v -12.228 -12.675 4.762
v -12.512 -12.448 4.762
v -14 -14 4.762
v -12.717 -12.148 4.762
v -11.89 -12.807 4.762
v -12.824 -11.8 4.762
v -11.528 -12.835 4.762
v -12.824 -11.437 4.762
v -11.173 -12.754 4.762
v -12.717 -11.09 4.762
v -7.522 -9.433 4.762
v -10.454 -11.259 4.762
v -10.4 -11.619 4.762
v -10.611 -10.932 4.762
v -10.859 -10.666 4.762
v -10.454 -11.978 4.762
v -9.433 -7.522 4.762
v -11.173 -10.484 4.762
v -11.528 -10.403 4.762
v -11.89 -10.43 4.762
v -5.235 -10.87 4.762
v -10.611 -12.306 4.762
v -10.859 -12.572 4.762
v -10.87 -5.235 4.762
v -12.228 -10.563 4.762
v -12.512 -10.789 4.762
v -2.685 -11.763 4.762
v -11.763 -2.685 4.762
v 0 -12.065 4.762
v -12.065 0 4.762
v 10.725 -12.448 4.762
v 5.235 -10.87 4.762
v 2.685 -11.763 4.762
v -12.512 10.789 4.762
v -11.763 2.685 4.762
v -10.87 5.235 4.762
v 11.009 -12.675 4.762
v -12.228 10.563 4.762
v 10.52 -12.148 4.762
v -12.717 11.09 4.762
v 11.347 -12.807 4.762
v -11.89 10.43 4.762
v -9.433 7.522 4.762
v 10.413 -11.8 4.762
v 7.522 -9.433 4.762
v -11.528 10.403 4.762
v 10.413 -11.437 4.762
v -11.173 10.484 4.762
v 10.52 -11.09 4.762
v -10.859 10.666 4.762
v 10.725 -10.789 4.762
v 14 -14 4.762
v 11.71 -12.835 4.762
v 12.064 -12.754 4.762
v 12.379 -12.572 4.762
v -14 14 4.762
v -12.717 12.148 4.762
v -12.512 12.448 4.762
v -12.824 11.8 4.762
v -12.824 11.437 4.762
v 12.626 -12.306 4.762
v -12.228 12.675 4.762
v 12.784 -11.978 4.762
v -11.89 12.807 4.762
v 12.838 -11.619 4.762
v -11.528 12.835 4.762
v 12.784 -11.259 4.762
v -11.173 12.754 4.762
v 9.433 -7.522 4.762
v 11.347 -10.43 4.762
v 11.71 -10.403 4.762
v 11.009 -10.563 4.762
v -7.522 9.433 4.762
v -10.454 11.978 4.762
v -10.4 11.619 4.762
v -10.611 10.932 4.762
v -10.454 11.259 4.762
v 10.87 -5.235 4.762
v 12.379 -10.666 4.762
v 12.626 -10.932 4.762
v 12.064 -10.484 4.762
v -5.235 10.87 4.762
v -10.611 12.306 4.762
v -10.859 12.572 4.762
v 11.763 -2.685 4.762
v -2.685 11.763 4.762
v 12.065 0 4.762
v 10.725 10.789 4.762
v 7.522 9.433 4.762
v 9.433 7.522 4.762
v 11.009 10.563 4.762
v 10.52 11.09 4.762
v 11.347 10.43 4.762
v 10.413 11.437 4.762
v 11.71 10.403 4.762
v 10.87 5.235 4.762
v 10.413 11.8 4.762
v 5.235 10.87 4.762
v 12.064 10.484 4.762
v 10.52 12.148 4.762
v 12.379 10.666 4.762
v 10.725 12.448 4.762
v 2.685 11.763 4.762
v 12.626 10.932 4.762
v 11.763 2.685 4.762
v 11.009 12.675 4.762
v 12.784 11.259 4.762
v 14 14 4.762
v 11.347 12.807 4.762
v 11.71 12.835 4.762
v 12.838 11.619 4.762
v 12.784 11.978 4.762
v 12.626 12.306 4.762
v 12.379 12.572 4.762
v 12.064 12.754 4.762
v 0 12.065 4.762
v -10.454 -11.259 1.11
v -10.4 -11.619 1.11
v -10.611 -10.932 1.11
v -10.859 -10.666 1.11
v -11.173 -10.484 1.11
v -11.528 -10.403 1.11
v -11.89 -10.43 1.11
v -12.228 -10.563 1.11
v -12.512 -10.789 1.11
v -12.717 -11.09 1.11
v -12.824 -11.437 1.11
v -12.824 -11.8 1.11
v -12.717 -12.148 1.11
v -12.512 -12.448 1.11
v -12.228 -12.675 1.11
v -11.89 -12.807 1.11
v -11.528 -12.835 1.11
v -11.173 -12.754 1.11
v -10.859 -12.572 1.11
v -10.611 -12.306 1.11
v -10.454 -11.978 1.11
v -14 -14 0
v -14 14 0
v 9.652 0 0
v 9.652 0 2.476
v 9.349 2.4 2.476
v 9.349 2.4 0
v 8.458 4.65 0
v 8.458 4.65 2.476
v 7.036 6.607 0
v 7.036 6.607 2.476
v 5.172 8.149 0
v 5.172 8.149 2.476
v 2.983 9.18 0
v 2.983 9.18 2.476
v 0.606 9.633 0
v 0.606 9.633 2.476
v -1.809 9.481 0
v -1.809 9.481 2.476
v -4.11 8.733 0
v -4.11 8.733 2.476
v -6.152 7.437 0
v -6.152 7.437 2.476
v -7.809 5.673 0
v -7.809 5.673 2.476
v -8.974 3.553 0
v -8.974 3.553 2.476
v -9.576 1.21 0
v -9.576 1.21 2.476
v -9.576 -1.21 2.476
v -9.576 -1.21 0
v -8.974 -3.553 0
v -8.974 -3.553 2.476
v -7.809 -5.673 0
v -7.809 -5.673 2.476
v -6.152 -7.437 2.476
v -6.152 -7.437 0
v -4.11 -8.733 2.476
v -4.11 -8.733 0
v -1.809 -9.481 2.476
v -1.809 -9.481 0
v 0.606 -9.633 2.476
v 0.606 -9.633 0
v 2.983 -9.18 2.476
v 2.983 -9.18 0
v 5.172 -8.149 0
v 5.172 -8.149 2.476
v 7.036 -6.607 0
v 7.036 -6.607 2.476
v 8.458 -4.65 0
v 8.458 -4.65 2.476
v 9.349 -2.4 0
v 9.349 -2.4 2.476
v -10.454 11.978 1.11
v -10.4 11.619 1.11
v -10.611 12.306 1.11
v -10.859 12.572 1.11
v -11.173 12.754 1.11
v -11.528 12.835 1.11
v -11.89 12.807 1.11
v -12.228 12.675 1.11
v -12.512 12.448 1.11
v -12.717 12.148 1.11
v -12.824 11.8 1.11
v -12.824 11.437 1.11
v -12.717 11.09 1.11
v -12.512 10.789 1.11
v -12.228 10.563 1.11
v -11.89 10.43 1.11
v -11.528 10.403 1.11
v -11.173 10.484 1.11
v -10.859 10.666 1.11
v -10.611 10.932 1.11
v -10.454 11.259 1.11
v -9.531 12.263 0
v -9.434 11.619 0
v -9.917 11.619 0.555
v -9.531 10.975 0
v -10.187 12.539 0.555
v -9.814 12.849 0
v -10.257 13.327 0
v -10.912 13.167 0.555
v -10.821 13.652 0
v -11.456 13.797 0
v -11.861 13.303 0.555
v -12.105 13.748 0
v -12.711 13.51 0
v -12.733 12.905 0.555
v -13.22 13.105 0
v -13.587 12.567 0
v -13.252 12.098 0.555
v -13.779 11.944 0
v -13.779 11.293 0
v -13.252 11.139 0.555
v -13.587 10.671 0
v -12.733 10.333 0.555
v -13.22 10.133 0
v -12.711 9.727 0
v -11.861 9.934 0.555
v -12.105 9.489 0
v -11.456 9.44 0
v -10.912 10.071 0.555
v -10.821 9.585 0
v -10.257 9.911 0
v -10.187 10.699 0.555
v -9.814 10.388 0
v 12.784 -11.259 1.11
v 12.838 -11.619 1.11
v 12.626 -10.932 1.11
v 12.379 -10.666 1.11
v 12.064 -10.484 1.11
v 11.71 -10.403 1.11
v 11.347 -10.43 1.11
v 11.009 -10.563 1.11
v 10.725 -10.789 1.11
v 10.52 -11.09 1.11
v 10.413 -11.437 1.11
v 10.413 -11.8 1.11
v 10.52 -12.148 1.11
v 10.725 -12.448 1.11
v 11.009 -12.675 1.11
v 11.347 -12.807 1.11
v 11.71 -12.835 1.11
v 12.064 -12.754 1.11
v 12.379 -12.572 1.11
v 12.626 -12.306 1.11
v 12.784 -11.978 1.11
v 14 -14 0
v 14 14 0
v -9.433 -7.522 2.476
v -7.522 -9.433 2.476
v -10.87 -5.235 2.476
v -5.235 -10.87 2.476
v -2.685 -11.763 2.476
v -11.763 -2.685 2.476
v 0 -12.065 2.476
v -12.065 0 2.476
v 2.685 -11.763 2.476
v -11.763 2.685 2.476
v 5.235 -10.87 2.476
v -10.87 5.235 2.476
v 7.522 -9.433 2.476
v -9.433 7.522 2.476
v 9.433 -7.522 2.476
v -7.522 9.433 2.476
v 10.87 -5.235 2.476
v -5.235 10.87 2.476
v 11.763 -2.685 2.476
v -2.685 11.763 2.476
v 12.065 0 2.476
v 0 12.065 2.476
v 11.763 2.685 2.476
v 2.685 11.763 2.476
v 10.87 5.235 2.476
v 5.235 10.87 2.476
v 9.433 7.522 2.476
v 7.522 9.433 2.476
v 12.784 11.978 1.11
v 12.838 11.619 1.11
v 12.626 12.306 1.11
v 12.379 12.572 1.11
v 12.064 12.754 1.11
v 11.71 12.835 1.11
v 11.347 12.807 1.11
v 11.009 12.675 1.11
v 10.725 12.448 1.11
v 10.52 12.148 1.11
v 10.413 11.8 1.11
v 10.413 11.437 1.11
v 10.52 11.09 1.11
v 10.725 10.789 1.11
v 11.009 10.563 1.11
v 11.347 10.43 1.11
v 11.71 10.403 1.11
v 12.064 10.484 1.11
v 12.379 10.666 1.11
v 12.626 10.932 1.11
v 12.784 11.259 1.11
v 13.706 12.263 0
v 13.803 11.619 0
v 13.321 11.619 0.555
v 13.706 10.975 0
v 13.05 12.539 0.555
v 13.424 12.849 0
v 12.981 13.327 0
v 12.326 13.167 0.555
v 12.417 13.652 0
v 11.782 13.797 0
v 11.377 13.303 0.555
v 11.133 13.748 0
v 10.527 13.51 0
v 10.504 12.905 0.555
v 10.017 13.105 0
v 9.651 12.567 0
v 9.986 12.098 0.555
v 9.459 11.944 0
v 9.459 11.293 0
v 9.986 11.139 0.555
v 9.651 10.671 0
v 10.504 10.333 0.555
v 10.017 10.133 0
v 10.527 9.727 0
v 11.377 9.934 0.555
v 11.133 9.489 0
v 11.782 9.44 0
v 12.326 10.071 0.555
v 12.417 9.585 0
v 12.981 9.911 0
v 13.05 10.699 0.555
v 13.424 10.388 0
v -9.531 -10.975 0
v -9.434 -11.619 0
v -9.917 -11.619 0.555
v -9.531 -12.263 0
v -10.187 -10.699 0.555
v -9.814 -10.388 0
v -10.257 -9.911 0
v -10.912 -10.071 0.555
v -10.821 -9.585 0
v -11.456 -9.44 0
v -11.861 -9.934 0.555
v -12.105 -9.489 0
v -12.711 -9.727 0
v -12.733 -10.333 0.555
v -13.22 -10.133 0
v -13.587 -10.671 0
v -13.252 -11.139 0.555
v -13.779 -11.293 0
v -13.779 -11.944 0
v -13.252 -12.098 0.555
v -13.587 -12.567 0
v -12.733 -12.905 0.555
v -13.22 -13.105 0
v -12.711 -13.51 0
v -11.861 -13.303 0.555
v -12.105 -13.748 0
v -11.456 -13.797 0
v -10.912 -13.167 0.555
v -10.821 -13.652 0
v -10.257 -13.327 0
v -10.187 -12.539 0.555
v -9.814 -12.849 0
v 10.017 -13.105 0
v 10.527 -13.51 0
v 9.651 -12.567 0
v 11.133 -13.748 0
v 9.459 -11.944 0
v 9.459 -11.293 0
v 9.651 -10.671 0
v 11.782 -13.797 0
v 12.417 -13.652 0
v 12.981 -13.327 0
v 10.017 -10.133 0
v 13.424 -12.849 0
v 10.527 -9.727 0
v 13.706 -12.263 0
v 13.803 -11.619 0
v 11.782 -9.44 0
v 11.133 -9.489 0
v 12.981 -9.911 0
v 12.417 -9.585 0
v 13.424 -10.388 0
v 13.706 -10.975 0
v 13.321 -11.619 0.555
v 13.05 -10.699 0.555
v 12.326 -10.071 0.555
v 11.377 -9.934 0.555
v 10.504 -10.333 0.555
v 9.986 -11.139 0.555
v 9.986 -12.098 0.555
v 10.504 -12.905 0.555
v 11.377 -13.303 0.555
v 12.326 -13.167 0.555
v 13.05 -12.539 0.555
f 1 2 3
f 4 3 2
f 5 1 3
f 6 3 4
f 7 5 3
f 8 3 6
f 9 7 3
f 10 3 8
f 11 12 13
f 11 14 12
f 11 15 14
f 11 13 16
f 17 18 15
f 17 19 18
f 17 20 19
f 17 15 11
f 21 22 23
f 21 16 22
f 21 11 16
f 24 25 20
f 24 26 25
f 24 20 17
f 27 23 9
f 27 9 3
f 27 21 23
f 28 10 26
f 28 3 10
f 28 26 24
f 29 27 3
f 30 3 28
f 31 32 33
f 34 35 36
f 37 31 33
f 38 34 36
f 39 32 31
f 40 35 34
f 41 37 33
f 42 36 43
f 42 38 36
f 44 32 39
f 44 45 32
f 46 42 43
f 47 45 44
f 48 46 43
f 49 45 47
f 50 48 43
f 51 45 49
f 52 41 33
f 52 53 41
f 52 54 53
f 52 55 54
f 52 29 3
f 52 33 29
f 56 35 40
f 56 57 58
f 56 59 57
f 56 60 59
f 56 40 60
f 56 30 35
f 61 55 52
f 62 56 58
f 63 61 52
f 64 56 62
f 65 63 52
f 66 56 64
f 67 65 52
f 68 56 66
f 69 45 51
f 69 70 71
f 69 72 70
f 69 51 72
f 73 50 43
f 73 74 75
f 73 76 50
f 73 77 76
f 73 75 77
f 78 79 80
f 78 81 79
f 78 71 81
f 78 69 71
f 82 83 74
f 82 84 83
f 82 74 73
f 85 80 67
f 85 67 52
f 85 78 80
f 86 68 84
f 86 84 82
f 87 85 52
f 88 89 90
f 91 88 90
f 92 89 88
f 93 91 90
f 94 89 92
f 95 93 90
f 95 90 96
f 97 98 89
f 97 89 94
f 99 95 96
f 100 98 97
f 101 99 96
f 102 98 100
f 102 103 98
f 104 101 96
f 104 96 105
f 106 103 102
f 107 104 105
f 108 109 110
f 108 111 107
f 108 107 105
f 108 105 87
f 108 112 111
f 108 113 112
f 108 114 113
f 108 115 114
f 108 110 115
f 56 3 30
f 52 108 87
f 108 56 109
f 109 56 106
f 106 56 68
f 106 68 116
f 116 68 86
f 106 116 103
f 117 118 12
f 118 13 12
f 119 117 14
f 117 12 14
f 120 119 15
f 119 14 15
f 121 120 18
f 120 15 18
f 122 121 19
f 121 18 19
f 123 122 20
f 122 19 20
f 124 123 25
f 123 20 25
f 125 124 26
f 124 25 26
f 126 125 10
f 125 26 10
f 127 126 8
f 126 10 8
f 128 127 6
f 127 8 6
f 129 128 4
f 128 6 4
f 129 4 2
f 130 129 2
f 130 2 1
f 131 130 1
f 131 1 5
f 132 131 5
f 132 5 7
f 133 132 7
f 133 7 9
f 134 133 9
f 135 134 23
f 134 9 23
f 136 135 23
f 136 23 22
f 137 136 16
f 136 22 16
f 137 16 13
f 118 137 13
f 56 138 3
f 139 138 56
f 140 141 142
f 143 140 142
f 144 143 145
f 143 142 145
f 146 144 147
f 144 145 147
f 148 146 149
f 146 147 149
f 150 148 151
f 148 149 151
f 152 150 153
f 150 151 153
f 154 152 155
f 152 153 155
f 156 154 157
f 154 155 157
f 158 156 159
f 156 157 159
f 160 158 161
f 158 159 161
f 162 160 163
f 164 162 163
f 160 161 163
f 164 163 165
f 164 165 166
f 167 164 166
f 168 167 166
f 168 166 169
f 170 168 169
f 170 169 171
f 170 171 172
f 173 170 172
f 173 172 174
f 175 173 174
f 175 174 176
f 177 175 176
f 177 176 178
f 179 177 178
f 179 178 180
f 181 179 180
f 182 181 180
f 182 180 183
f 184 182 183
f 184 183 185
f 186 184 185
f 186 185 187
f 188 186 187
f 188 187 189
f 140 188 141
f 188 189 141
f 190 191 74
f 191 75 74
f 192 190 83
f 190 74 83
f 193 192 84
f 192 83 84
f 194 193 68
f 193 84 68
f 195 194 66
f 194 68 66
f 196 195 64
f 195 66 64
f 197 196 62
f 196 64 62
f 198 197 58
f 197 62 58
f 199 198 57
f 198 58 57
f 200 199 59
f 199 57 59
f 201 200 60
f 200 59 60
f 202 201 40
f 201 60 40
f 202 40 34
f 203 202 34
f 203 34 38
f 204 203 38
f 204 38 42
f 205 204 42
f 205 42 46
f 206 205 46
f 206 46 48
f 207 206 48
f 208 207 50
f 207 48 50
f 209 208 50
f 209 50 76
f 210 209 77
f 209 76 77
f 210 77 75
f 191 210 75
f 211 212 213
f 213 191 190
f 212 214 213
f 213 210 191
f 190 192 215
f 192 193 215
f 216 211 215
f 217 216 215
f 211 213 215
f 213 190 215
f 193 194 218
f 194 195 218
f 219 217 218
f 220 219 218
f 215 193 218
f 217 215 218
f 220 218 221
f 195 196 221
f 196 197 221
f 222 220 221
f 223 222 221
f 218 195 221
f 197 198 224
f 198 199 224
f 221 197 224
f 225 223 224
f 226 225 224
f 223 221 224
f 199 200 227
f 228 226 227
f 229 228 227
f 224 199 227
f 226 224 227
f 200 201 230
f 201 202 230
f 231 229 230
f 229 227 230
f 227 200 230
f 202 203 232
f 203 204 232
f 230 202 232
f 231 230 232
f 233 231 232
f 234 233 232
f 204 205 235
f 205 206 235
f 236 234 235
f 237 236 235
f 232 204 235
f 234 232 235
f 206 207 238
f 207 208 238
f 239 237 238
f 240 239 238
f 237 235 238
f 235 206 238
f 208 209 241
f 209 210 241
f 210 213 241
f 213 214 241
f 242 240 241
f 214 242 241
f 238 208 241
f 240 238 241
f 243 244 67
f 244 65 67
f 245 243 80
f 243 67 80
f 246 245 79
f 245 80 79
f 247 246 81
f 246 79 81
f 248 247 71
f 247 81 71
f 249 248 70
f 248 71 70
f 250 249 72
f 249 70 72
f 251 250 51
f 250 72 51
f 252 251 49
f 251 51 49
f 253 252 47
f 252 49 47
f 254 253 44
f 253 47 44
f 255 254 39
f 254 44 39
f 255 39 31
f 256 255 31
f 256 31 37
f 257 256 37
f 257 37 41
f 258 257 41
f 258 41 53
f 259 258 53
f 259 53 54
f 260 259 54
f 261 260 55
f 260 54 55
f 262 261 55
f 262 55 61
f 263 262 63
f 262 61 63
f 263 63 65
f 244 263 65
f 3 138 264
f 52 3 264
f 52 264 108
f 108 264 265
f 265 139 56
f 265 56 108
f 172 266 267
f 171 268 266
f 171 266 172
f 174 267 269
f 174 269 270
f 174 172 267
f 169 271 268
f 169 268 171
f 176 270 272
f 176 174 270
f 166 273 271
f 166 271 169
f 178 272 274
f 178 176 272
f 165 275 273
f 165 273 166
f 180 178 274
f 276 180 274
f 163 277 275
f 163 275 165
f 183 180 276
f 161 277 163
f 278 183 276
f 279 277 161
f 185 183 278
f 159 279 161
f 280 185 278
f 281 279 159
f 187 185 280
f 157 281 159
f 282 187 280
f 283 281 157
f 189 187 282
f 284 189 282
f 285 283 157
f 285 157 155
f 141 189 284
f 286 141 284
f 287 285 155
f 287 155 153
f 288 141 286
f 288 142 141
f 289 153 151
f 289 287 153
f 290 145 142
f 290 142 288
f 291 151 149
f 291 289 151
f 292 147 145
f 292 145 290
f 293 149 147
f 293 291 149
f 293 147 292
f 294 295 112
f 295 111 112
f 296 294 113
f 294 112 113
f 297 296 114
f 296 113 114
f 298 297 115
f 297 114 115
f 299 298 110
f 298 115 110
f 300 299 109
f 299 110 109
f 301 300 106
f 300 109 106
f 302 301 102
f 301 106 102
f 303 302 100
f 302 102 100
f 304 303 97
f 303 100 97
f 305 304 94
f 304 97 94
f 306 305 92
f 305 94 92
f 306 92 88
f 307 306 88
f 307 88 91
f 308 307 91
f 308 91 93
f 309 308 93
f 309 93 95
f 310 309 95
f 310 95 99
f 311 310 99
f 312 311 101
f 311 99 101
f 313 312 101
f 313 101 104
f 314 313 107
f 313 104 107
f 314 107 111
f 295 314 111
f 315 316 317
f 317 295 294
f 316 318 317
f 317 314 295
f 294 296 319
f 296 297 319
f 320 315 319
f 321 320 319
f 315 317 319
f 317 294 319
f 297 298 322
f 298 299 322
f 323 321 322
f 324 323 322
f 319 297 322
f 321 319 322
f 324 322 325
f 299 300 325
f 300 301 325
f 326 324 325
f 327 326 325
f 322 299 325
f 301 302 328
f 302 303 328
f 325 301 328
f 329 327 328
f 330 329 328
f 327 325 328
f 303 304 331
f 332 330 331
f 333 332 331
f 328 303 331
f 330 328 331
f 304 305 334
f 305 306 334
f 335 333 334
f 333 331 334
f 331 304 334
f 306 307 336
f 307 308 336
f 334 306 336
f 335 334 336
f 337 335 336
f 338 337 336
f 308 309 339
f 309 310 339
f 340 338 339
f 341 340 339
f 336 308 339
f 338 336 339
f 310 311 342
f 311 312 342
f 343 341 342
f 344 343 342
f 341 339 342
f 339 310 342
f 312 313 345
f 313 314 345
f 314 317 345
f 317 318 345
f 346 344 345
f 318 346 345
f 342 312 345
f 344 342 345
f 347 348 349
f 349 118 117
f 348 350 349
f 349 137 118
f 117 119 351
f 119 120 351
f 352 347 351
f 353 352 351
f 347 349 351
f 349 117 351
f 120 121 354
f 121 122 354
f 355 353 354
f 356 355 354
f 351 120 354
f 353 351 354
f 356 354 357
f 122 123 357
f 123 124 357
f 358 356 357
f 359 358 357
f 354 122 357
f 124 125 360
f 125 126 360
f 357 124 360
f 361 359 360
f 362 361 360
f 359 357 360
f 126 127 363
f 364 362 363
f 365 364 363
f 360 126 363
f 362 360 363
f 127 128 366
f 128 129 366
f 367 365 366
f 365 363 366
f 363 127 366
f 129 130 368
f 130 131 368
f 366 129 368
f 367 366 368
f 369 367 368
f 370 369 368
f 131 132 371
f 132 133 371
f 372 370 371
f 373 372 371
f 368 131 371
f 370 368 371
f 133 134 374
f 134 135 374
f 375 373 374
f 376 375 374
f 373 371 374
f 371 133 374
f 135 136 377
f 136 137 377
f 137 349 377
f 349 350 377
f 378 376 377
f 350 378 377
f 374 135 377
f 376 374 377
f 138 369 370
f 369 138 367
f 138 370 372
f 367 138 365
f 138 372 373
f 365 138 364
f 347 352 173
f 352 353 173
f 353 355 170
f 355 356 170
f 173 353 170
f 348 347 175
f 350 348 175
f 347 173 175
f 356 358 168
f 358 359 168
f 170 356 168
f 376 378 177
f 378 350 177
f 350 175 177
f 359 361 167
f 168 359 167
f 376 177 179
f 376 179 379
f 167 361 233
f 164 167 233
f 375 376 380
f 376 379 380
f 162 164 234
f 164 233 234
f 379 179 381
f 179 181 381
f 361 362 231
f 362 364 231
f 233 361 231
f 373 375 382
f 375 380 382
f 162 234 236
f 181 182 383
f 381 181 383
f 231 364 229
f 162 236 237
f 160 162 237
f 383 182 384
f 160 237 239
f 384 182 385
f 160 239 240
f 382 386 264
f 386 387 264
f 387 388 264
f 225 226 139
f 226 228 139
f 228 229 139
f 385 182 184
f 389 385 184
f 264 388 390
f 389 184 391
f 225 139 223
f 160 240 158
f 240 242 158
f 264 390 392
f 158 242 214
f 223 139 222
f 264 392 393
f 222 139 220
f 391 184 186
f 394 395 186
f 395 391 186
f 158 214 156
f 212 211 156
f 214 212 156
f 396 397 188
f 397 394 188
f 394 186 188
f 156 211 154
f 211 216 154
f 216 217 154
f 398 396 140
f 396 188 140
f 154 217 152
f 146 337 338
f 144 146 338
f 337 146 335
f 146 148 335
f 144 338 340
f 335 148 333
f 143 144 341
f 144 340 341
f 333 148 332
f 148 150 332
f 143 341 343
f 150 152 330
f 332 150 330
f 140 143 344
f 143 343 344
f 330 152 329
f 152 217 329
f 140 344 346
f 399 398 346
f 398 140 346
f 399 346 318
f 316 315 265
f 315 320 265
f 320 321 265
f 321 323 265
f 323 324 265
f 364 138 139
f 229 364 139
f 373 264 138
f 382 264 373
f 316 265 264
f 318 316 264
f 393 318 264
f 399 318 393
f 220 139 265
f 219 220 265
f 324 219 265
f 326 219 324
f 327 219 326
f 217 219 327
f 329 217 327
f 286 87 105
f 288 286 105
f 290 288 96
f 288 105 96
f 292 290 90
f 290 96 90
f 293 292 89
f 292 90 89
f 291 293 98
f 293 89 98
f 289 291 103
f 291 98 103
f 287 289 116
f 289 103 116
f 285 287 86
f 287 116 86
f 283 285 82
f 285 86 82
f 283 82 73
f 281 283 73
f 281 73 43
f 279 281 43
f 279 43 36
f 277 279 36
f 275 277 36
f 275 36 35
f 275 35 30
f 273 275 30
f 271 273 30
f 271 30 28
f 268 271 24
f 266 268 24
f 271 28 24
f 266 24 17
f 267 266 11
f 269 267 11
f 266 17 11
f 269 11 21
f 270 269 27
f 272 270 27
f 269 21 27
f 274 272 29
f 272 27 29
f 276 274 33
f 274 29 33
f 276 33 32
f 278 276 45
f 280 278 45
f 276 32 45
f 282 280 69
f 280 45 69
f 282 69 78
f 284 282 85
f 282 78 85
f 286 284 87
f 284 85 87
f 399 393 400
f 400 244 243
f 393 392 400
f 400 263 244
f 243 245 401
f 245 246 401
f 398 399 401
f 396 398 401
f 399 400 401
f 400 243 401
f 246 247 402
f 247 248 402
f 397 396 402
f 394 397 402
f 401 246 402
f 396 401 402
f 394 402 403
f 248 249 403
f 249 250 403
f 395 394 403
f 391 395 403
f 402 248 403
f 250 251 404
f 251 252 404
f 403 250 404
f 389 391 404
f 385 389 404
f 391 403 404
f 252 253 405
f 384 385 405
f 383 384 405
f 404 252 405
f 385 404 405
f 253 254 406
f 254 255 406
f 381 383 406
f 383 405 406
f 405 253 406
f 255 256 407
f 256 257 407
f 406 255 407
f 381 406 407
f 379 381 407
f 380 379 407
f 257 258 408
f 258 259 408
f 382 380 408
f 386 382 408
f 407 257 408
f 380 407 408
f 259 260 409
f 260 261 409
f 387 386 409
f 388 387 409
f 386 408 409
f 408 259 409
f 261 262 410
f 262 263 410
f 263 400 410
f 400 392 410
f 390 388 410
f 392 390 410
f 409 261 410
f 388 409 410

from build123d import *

# Parameters (mm, degrees)
SKETCH1_W                                      = 27.99999988
SKETCH1_H                                      = 28
BOSS_EXTRUDE1_DEPTH                            = 4.7625
SKETCH2_R                                      = 12.065
CUT_EXTRUDE1_DEPTH                             = 2.286
SKETCH3_R                                      = 9.652
CUT_EXTRUDE2_DEPTH                             = 3.4765
CSK_FOR_2_FLAT_HEAD_MACHINE_SCREW1_D           = 2.4384
CSK_FOR_2_FLAT_HEAD_MACHINE_SCREW1_CSINK_D     = 4.3688
CSK_FOR_2_FLAT_HEAD_MACHINE_SCREW1_CSINK_ANGLE = 82


with BuildPart() as part:
    # Sketch1 → Boss-Extrude1 (new body)
    with BuildSketch(Plane.XY):
        Rectangle(SKETCH1_W, SKETCH1_H)
    extrude(amount=BOSS_EXTRUDE1_DEPTH)

    # Sketch2 → Cut-Extrude1 (cut)
    with BuildSketch(Plane.XY.offset(4.7625)):
        Circle(SKETCH2_R)
    extrude(amount=-CUT_EXTRUDE1_DEPTH, mode=Mode.SUBTRACT)

    # Sketch3 → Cut-Extrude2 (cut, through all)
    with BuildSketch(Plane.XY.offset(2.4765)):
        Circle(SKETCH3_R)
    extrude(amount=-CUT_EXTRUDE2_DEPTH, mode=Mode.SUBTRACT)

    # CSK for #2 Flat Head Machine Screw1 (through all)
    with Locations(Plane(origin=(0, 0, 0), x_dir=(-1, 0, 0), z_dir=(0, 0, -1))):
        with Locations((11.61874994, 11.61875), (11.61874994, -11.61875), (-11.61874994, -11.61875), (-11.61874994, 11.61875)):
            CounterSinkHole(CSK_FOR_2_FLAT_HEAD_MACHINE_SCREW1_D / 2, CSK_FOR_2_FLAT_HEAD_MACHINE_SCREW1_CSINK_D / 2, counter_sink_angle=CSK_FOR_2_FLAT_HEAD_MACHINE_SCREW1_CSINK_ANGLE)


solid = part.part
